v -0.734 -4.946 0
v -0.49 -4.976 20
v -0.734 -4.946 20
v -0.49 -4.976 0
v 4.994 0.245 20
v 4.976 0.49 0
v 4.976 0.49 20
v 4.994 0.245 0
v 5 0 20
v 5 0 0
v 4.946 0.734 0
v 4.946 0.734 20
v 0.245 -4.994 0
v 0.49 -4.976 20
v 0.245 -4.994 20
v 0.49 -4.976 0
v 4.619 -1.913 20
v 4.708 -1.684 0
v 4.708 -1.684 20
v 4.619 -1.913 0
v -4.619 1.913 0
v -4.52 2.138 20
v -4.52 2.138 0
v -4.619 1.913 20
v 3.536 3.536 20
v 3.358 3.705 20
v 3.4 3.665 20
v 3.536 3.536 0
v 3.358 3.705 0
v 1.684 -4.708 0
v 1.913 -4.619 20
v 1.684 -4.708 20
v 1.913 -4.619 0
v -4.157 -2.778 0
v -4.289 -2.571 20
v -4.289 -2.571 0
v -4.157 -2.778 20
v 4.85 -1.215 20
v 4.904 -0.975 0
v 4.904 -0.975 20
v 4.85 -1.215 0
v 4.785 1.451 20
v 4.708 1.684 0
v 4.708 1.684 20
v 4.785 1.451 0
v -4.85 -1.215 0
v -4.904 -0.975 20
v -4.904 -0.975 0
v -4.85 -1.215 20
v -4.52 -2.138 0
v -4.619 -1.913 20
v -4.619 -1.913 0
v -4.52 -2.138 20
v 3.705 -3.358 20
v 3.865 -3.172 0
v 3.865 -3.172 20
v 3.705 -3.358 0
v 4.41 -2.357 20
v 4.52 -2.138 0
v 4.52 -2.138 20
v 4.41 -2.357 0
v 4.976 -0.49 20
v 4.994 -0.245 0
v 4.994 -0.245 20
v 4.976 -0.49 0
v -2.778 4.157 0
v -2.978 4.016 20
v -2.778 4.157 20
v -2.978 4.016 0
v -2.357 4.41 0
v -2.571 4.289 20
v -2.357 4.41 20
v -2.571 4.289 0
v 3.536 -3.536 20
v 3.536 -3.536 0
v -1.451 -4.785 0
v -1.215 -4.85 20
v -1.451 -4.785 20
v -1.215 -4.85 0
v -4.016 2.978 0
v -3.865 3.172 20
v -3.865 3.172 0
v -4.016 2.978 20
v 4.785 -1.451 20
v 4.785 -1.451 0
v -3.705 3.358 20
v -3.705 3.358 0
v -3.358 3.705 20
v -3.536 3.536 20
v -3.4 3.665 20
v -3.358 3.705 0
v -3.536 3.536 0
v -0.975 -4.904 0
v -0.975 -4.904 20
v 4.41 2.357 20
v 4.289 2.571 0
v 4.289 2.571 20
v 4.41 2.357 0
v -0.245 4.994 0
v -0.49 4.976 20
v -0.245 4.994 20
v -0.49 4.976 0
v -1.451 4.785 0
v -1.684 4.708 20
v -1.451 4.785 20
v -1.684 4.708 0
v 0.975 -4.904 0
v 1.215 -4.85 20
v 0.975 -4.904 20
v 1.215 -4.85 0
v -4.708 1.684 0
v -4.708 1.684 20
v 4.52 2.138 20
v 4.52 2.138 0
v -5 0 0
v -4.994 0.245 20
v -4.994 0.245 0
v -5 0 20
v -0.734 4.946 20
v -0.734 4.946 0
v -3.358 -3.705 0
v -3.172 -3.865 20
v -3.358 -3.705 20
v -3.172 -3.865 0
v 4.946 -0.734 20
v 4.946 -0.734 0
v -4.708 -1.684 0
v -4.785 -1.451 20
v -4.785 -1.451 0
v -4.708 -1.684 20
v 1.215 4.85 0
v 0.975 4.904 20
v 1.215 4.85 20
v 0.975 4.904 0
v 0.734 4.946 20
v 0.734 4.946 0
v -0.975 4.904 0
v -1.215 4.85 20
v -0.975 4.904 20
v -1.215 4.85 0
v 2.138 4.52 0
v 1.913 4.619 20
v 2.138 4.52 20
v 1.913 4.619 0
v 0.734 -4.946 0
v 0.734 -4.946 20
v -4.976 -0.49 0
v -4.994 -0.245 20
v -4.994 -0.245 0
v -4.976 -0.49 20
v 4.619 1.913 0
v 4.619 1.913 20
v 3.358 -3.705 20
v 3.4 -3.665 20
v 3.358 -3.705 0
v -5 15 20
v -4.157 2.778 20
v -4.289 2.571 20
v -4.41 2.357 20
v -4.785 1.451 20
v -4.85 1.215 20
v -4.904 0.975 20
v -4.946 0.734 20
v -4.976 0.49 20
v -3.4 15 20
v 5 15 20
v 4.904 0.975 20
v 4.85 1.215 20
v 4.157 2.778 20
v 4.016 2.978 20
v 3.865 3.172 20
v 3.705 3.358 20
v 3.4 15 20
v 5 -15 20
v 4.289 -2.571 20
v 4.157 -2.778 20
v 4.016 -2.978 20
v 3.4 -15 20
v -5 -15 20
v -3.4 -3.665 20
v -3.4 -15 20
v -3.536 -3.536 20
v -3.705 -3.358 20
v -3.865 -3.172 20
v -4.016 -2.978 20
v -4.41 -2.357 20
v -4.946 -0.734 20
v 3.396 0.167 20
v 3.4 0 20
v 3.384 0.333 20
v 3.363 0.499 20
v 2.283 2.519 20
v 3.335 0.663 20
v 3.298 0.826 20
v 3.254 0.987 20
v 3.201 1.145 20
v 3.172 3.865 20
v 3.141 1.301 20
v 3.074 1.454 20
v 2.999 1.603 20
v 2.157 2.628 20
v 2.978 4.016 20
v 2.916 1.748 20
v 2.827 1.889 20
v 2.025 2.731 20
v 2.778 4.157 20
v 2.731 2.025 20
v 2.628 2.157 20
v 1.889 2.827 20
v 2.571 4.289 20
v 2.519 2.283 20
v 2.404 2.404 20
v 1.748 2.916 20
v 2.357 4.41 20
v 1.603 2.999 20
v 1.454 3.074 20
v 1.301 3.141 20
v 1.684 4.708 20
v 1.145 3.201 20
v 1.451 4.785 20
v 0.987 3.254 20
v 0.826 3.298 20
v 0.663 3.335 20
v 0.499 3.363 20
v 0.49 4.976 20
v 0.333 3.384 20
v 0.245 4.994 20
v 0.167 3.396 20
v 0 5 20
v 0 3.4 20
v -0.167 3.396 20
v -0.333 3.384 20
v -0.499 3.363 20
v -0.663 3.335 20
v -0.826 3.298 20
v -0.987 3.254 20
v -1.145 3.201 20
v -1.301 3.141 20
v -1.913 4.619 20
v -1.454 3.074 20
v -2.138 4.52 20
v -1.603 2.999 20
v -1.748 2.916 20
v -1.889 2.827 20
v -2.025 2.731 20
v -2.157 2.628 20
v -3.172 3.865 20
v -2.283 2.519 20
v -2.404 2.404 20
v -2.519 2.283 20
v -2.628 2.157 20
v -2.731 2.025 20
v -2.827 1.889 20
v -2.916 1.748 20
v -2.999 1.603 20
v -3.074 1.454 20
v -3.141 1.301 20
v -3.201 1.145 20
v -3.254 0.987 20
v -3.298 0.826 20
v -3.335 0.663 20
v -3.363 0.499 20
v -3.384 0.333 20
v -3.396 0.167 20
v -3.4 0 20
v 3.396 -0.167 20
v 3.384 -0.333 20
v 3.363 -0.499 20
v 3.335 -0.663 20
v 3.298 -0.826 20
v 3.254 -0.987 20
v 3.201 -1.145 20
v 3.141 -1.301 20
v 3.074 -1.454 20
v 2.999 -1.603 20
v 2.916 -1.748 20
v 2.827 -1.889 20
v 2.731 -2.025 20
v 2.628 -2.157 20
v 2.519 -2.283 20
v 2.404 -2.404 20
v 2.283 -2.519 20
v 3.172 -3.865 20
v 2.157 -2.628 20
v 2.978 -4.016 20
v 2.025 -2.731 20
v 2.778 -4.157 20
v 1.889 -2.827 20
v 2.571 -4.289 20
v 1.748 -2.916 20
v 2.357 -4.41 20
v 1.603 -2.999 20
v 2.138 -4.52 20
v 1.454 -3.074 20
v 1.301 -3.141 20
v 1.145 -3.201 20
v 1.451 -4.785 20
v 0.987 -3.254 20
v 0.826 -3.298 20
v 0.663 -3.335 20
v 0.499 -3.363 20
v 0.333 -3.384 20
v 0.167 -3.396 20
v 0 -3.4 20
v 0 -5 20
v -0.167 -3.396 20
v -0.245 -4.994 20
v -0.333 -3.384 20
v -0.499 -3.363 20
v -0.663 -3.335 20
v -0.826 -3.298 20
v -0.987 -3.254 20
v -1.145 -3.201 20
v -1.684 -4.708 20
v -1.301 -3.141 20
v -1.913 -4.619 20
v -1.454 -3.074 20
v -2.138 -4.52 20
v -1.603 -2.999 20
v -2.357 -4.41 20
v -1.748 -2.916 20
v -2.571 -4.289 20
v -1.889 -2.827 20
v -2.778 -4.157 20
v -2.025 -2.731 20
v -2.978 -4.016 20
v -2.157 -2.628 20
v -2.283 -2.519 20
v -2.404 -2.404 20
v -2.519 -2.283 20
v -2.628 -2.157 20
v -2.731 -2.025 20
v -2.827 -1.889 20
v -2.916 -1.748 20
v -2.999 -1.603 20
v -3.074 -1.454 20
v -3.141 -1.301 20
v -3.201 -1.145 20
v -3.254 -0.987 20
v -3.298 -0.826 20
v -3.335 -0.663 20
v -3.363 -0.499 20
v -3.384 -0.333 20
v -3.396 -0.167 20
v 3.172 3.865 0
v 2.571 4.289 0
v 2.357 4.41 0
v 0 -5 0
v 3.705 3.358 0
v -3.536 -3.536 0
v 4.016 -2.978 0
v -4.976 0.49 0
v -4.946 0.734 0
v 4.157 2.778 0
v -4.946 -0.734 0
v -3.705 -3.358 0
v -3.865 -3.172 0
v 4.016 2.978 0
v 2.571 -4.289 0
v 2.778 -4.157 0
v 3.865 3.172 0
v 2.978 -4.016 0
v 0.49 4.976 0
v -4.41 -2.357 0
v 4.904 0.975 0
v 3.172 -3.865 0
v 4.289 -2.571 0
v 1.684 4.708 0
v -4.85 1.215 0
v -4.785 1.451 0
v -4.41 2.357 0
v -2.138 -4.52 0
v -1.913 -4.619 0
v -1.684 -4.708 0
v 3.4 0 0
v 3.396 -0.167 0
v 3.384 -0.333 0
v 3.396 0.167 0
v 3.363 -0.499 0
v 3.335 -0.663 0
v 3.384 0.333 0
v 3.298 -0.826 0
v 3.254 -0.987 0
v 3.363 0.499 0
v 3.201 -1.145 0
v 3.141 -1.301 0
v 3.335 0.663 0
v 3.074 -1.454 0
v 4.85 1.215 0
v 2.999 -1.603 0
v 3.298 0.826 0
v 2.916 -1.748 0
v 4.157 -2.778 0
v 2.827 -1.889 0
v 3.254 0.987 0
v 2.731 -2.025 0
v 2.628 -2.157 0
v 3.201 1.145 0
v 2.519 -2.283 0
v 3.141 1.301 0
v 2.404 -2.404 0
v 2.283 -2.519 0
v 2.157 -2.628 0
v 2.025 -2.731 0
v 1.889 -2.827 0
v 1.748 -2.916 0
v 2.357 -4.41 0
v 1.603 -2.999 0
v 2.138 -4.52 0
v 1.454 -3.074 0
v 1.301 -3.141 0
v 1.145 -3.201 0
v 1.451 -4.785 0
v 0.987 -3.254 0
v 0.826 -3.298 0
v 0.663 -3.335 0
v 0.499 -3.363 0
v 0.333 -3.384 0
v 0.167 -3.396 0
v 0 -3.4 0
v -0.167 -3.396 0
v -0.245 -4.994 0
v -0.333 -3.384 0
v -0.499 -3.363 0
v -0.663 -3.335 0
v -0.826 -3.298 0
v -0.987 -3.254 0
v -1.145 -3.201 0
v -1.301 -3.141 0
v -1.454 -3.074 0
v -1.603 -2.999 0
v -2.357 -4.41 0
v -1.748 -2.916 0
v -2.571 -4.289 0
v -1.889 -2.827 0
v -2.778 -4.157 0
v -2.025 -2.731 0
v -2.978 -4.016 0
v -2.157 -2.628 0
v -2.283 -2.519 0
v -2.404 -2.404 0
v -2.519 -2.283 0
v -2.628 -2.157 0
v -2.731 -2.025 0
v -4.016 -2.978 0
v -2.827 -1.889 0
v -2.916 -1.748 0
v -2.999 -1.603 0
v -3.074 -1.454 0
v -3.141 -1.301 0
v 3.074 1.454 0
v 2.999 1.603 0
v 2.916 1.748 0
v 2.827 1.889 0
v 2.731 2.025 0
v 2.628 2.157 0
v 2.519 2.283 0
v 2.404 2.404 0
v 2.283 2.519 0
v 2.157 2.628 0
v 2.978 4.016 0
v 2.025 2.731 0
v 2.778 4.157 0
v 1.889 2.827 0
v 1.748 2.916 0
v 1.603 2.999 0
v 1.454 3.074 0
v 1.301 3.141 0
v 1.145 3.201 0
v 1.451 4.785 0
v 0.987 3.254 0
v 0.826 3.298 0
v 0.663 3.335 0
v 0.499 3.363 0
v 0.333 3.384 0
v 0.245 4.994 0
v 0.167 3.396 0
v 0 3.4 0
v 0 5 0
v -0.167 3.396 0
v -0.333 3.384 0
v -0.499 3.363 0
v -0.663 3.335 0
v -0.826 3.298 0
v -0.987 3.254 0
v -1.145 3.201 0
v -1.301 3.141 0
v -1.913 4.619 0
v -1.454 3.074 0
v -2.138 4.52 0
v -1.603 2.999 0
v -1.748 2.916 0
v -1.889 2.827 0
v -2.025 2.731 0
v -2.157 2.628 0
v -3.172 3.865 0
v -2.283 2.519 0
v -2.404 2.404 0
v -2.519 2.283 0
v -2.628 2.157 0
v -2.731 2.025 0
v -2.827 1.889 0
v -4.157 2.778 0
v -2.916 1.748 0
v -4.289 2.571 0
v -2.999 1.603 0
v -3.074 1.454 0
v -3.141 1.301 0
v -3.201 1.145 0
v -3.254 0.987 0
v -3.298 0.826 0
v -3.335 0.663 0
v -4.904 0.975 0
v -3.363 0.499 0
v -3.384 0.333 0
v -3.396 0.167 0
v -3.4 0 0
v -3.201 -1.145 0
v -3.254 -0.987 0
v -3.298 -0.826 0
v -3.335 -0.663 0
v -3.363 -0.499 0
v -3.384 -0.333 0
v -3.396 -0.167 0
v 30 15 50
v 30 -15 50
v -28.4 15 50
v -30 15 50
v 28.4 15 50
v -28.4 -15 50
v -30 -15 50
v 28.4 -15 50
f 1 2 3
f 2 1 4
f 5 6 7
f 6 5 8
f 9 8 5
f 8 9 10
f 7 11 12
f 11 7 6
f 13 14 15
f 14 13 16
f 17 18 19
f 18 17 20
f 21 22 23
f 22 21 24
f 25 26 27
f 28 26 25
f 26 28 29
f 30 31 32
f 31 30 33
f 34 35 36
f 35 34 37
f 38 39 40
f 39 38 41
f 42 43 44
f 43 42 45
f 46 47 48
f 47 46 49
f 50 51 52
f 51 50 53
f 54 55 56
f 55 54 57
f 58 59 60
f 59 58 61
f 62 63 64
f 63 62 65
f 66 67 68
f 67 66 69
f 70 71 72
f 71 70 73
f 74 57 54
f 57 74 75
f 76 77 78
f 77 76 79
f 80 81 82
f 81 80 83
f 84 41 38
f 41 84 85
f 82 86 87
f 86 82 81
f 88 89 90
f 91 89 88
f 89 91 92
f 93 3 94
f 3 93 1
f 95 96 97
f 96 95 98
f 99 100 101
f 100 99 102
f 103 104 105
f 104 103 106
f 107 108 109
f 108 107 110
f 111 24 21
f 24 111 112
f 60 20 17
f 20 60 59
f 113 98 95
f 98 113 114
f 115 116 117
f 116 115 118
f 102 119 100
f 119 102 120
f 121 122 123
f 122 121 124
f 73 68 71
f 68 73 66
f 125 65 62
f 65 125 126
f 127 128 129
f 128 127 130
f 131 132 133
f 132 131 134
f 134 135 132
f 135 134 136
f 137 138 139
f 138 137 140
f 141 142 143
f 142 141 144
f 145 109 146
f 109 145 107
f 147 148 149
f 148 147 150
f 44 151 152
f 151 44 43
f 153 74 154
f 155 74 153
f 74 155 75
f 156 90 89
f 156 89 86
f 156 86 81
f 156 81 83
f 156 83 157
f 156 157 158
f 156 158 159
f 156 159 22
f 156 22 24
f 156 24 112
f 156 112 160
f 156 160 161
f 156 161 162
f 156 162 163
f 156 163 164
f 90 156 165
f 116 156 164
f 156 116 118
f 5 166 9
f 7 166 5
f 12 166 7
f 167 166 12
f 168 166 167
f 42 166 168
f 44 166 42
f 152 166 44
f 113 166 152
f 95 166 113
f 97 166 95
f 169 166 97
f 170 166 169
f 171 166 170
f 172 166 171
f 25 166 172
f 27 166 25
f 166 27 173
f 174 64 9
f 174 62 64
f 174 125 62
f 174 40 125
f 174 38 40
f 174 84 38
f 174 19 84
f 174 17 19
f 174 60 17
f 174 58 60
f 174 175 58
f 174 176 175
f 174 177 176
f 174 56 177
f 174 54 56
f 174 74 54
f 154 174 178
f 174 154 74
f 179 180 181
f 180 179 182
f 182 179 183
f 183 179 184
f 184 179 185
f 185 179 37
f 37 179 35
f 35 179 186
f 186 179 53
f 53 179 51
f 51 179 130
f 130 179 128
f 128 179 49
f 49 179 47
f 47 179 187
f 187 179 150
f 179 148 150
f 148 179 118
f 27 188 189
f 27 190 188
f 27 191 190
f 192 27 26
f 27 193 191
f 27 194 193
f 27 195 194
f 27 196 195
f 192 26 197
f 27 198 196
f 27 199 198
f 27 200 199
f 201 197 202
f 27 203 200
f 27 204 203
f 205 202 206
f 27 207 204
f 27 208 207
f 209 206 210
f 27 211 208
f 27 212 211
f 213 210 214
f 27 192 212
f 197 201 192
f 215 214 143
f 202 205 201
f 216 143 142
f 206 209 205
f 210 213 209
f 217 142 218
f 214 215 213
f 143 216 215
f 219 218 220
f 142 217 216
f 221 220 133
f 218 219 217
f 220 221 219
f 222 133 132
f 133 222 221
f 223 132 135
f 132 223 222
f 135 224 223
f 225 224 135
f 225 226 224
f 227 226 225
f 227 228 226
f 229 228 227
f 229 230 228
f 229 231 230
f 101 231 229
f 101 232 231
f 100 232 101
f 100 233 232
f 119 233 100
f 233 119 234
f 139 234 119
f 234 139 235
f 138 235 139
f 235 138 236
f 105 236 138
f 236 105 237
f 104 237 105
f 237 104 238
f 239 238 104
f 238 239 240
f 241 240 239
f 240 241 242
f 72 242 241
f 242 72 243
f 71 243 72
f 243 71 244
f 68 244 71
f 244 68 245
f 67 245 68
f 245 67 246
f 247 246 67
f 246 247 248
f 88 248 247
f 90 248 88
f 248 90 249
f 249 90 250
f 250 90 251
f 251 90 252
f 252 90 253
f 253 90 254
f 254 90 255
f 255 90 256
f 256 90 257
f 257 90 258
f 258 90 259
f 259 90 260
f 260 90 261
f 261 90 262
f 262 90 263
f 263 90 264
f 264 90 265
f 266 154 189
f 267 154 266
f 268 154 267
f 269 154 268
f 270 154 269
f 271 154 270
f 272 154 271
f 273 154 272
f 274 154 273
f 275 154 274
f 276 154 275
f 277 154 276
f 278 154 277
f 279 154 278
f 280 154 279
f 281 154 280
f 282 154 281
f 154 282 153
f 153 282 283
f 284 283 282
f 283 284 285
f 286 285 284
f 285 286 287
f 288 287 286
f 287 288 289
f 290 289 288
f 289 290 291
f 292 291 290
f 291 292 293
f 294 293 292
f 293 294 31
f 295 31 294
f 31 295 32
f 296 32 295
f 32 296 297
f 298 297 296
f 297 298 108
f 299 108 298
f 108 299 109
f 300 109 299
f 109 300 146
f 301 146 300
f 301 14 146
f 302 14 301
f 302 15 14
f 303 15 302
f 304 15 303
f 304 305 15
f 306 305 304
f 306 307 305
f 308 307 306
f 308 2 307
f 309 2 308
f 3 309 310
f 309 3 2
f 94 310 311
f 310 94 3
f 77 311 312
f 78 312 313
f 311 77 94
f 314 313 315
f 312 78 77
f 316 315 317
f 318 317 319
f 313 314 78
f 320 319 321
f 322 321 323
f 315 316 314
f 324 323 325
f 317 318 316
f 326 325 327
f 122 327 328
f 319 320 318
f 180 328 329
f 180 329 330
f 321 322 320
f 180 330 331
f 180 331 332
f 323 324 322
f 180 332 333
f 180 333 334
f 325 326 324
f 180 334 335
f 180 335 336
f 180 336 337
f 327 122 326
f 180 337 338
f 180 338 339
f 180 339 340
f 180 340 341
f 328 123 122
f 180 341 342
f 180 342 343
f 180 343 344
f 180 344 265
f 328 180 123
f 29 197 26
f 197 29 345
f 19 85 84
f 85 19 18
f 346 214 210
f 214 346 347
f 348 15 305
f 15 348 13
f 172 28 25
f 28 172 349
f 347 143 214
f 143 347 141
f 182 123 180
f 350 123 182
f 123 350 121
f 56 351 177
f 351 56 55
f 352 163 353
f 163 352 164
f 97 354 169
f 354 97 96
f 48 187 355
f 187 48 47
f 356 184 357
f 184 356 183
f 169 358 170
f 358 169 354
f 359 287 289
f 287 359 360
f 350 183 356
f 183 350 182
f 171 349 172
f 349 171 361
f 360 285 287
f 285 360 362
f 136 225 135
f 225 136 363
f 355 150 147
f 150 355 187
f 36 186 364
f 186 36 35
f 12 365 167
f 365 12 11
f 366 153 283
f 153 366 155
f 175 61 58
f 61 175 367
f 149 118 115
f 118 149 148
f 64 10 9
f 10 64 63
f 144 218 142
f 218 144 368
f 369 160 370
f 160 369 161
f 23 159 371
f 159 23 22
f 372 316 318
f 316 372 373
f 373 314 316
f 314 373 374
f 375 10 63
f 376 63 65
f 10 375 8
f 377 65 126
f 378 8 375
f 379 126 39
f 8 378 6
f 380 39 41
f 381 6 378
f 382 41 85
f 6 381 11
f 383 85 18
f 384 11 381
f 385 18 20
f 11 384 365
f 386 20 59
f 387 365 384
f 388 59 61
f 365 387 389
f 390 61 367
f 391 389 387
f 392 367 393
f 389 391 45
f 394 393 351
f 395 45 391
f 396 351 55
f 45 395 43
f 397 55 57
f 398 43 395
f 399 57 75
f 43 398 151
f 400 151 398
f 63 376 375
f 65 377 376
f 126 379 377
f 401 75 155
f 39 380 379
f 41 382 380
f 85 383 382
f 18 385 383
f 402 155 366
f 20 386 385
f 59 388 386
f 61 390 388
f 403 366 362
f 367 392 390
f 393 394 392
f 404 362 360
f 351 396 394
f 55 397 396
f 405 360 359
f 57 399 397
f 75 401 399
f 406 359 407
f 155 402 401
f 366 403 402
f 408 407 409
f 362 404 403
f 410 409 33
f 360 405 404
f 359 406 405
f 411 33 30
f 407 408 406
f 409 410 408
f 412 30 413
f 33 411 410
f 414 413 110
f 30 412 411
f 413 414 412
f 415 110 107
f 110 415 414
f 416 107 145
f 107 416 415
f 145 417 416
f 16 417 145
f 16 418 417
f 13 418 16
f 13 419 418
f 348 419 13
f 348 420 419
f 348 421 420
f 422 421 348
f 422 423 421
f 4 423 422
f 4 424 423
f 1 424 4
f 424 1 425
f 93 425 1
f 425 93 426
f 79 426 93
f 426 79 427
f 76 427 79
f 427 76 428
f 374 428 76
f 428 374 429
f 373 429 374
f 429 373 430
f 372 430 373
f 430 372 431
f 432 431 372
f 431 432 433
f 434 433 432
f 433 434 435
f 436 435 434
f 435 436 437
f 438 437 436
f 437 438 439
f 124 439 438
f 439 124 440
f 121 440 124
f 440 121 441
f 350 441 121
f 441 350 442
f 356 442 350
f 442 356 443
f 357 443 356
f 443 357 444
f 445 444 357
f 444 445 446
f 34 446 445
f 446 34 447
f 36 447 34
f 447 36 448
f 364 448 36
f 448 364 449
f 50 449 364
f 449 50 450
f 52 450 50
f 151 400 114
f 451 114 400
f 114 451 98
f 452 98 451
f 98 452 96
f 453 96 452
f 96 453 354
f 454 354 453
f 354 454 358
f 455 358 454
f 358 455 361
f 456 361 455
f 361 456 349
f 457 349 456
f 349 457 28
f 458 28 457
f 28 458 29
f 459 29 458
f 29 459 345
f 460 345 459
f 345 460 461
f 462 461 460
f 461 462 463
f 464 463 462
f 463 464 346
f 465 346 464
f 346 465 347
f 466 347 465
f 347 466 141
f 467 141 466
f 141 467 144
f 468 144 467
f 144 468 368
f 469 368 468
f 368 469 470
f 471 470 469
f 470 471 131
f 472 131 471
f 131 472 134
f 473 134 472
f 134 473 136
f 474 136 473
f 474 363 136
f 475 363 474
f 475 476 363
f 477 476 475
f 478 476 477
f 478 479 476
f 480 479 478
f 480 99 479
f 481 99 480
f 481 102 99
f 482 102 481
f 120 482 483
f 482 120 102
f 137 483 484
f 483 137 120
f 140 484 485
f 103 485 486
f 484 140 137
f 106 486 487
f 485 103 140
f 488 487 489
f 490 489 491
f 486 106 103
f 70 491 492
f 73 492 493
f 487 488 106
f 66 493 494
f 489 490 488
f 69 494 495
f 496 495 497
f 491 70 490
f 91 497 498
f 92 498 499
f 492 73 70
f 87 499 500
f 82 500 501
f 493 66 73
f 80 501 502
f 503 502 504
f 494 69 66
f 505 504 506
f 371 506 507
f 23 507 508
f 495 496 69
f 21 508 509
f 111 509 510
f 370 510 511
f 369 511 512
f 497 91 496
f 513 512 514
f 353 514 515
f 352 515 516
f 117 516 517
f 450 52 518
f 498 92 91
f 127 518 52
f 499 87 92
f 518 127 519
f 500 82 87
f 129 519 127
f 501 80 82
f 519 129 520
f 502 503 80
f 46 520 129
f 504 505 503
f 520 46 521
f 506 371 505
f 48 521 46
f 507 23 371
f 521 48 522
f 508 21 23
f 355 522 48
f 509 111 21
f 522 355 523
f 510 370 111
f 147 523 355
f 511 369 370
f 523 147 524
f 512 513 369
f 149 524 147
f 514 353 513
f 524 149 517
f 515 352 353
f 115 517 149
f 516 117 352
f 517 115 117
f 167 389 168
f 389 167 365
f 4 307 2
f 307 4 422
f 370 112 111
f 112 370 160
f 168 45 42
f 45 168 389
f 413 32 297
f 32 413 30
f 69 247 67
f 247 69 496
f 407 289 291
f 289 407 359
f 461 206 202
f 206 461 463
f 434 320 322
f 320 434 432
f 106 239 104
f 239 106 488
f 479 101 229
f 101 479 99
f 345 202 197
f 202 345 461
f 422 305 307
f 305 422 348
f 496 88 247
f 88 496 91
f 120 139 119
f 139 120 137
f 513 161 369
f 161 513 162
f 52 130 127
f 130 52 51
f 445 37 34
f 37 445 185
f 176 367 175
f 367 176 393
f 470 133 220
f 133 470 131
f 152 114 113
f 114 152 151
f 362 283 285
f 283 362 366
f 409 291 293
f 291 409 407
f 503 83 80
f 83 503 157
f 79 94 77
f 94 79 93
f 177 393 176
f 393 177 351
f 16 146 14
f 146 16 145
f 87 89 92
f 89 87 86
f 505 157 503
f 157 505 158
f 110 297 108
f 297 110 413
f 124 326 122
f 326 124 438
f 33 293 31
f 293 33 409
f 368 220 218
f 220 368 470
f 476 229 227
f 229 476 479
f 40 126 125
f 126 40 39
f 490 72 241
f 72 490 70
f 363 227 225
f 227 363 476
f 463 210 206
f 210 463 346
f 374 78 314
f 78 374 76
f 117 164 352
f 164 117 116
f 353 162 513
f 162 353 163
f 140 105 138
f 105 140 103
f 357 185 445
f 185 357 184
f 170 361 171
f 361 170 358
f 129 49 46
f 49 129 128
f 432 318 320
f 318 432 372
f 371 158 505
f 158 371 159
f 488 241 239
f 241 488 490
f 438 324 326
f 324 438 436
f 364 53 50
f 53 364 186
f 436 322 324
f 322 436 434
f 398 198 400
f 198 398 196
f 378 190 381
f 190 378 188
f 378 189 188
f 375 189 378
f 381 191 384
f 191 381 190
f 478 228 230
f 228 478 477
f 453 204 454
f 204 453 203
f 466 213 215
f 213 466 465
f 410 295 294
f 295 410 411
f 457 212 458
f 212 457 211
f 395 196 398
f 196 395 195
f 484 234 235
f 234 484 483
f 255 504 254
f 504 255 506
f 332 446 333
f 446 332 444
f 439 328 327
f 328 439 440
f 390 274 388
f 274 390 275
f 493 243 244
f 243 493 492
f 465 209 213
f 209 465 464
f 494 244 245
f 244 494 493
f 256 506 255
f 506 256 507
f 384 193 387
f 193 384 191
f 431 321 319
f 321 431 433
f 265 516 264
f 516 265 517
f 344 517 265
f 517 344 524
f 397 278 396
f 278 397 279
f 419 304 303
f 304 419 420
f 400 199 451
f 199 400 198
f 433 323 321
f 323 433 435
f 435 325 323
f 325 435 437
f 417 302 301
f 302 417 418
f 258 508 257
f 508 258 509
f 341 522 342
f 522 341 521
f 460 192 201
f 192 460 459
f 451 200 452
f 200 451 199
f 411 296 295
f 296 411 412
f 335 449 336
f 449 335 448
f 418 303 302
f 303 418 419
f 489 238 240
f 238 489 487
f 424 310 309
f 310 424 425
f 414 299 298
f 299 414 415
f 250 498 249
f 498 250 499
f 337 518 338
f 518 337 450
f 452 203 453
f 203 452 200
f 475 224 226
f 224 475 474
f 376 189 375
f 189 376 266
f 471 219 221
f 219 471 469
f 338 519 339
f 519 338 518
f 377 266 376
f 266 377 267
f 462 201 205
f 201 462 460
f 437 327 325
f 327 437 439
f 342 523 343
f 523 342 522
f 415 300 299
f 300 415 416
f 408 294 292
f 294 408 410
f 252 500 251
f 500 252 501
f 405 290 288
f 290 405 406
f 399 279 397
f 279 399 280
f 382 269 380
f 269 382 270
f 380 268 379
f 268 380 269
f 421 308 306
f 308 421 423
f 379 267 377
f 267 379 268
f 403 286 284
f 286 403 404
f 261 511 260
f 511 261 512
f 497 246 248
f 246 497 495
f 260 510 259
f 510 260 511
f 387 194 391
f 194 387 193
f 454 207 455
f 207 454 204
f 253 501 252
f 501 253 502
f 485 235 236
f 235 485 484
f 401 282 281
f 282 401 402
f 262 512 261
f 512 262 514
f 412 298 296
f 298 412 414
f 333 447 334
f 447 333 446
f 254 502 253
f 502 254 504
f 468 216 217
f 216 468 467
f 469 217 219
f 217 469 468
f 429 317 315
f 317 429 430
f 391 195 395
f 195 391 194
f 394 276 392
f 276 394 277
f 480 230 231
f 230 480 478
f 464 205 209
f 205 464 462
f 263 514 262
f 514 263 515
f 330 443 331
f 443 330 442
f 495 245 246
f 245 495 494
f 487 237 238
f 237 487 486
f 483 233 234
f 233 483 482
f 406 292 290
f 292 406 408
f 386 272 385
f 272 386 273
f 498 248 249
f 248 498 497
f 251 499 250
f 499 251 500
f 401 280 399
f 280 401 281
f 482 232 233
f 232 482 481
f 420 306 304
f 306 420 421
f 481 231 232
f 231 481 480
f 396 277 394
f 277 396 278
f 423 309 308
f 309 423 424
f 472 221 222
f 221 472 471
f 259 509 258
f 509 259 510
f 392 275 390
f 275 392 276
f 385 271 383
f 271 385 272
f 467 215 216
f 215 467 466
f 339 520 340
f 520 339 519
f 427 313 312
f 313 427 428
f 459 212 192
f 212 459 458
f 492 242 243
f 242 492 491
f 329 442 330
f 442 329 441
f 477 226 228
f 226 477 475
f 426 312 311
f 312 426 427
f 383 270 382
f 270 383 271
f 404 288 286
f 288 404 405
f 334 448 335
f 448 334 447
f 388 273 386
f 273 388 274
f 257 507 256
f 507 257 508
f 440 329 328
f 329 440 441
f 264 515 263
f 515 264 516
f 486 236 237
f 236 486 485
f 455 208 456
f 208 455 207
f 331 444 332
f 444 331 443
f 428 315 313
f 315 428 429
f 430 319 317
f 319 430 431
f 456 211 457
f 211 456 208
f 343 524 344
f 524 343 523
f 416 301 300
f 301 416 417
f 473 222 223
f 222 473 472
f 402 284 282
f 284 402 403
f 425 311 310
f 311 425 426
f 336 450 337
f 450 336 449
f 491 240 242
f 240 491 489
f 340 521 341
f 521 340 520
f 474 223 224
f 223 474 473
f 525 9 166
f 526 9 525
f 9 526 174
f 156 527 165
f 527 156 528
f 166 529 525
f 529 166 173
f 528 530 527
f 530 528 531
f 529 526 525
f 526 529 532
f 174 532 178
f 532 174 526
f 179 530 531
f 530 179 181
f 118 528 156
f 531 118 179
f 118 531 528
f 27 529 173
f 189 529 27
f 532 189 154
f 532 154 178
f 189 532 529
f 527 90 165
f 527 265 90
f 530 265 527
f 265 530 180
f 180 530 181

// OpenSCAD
// Lab Funnel Design (Corrected)
// Units: millimetres
// Orientation: Upright, wide opening at top, rests on XY plane at z=0.

// --- Dimensions ---
// Spout (Tube)
$spout_outer_diameter = 10;
$spout_inner_diameter = 6.8; // 10 - 2*1.6
$spout_length = 20;

// Cone (Funnel)
$cone_bottom_diameter = 10;  // Matches spout outer diameter
$cone_top_diameter = 60;     // Rim diameter
$cone_height = 30;           // From z=20 to z=50

// Wall Thickness
$wall_thickness = 1.6;

// Resolution for curved surfaces
$fn = 128;

// --- Helper Functions ---

// Function to create a hollow cylinder (tube)
// Arguments: outer_d, inner_d, height, center_z
module hollow_cylinder(outer_d, inner_d, height, center_z) {
    translate([0, 0, center_z - height/2]) {
        difference() {
            cylinder(h = height, d = outer_d, $fn = $fn);
            cylinder(h = height, d = inner_d, $fn = $fn);
        }
    }
}

// Function to create a hollow cone using rotate_extrude
// Arguments: bottom_d, top_d, height, center_z
// The cone tapers from bottom_d at center_z - height/2 to top_d at center_z + height/2
module hollow_cone(bottom_d, top_d, height, center_z) {
    translate([0, 0, center_z - height/2]) {
        difference() {
            // Outer Cone
            // We define a profile in the XZ plane (using polygon) and rotate it 90 deg around X
            // to make it lie in the XY plane, then use linear_extrude to build the cone along Z.
            // Profile points: (-bottom_d/2, 0), (-top_d/2, height), (top_d/2, height), (bottom_d/2, 0)
            rotate([90, 0, 0]) {
                linear_extrude(height = height, center = true) {
                    polygon(points = [
                        [-bottom_d/2, 0],
                        [-top_d/2, height],
                        [top_d/2, height],
                        [bottom_d/2, 0]
                    ]);
                }
            }
            
            // Inner Cone (Hole)
            // Calculate inner diameters
            $inner_bottom_d = bottom_d - 2*$wall_thickness;
            $inner_top_d = top_d - 2*$wall_thickness;
            
            rotate([90, 0, 0]) {
                linear_extrude(height = height, center = true) {
                    polygon(points = [
                        [-($inner_bottom_d)/2, 0],
                        [-($inner_top_d)/2, height],
                        [($inner_top_d)/2, height],
                        [($inner_bottom_d)/2, 0]
                    ]);
                }
            }
        }
    }
}

// --- Main Assembly ---

// 1. Build the Spout (Tube)
// Located from z = 0 to z = 20. Centered at z = 10.
hollow_cylinder(
    outer_d = $spout_outer_diameter,
    inner_d = $spout_inner_diameter,
    height = $spout_length,
    center_z = $spout_length / 2
);

// 2. Build the Cone (Funnel)
// Located from z = 20 to z = 50. Centered at z = 35.
hollow_cone(
    bottom_d = $cone_bottom_diameter,
    top_d = $cone_top_diameter,
    height = $cone_height,
    center_z = $spout_length + ($cone_height / 2)
);
